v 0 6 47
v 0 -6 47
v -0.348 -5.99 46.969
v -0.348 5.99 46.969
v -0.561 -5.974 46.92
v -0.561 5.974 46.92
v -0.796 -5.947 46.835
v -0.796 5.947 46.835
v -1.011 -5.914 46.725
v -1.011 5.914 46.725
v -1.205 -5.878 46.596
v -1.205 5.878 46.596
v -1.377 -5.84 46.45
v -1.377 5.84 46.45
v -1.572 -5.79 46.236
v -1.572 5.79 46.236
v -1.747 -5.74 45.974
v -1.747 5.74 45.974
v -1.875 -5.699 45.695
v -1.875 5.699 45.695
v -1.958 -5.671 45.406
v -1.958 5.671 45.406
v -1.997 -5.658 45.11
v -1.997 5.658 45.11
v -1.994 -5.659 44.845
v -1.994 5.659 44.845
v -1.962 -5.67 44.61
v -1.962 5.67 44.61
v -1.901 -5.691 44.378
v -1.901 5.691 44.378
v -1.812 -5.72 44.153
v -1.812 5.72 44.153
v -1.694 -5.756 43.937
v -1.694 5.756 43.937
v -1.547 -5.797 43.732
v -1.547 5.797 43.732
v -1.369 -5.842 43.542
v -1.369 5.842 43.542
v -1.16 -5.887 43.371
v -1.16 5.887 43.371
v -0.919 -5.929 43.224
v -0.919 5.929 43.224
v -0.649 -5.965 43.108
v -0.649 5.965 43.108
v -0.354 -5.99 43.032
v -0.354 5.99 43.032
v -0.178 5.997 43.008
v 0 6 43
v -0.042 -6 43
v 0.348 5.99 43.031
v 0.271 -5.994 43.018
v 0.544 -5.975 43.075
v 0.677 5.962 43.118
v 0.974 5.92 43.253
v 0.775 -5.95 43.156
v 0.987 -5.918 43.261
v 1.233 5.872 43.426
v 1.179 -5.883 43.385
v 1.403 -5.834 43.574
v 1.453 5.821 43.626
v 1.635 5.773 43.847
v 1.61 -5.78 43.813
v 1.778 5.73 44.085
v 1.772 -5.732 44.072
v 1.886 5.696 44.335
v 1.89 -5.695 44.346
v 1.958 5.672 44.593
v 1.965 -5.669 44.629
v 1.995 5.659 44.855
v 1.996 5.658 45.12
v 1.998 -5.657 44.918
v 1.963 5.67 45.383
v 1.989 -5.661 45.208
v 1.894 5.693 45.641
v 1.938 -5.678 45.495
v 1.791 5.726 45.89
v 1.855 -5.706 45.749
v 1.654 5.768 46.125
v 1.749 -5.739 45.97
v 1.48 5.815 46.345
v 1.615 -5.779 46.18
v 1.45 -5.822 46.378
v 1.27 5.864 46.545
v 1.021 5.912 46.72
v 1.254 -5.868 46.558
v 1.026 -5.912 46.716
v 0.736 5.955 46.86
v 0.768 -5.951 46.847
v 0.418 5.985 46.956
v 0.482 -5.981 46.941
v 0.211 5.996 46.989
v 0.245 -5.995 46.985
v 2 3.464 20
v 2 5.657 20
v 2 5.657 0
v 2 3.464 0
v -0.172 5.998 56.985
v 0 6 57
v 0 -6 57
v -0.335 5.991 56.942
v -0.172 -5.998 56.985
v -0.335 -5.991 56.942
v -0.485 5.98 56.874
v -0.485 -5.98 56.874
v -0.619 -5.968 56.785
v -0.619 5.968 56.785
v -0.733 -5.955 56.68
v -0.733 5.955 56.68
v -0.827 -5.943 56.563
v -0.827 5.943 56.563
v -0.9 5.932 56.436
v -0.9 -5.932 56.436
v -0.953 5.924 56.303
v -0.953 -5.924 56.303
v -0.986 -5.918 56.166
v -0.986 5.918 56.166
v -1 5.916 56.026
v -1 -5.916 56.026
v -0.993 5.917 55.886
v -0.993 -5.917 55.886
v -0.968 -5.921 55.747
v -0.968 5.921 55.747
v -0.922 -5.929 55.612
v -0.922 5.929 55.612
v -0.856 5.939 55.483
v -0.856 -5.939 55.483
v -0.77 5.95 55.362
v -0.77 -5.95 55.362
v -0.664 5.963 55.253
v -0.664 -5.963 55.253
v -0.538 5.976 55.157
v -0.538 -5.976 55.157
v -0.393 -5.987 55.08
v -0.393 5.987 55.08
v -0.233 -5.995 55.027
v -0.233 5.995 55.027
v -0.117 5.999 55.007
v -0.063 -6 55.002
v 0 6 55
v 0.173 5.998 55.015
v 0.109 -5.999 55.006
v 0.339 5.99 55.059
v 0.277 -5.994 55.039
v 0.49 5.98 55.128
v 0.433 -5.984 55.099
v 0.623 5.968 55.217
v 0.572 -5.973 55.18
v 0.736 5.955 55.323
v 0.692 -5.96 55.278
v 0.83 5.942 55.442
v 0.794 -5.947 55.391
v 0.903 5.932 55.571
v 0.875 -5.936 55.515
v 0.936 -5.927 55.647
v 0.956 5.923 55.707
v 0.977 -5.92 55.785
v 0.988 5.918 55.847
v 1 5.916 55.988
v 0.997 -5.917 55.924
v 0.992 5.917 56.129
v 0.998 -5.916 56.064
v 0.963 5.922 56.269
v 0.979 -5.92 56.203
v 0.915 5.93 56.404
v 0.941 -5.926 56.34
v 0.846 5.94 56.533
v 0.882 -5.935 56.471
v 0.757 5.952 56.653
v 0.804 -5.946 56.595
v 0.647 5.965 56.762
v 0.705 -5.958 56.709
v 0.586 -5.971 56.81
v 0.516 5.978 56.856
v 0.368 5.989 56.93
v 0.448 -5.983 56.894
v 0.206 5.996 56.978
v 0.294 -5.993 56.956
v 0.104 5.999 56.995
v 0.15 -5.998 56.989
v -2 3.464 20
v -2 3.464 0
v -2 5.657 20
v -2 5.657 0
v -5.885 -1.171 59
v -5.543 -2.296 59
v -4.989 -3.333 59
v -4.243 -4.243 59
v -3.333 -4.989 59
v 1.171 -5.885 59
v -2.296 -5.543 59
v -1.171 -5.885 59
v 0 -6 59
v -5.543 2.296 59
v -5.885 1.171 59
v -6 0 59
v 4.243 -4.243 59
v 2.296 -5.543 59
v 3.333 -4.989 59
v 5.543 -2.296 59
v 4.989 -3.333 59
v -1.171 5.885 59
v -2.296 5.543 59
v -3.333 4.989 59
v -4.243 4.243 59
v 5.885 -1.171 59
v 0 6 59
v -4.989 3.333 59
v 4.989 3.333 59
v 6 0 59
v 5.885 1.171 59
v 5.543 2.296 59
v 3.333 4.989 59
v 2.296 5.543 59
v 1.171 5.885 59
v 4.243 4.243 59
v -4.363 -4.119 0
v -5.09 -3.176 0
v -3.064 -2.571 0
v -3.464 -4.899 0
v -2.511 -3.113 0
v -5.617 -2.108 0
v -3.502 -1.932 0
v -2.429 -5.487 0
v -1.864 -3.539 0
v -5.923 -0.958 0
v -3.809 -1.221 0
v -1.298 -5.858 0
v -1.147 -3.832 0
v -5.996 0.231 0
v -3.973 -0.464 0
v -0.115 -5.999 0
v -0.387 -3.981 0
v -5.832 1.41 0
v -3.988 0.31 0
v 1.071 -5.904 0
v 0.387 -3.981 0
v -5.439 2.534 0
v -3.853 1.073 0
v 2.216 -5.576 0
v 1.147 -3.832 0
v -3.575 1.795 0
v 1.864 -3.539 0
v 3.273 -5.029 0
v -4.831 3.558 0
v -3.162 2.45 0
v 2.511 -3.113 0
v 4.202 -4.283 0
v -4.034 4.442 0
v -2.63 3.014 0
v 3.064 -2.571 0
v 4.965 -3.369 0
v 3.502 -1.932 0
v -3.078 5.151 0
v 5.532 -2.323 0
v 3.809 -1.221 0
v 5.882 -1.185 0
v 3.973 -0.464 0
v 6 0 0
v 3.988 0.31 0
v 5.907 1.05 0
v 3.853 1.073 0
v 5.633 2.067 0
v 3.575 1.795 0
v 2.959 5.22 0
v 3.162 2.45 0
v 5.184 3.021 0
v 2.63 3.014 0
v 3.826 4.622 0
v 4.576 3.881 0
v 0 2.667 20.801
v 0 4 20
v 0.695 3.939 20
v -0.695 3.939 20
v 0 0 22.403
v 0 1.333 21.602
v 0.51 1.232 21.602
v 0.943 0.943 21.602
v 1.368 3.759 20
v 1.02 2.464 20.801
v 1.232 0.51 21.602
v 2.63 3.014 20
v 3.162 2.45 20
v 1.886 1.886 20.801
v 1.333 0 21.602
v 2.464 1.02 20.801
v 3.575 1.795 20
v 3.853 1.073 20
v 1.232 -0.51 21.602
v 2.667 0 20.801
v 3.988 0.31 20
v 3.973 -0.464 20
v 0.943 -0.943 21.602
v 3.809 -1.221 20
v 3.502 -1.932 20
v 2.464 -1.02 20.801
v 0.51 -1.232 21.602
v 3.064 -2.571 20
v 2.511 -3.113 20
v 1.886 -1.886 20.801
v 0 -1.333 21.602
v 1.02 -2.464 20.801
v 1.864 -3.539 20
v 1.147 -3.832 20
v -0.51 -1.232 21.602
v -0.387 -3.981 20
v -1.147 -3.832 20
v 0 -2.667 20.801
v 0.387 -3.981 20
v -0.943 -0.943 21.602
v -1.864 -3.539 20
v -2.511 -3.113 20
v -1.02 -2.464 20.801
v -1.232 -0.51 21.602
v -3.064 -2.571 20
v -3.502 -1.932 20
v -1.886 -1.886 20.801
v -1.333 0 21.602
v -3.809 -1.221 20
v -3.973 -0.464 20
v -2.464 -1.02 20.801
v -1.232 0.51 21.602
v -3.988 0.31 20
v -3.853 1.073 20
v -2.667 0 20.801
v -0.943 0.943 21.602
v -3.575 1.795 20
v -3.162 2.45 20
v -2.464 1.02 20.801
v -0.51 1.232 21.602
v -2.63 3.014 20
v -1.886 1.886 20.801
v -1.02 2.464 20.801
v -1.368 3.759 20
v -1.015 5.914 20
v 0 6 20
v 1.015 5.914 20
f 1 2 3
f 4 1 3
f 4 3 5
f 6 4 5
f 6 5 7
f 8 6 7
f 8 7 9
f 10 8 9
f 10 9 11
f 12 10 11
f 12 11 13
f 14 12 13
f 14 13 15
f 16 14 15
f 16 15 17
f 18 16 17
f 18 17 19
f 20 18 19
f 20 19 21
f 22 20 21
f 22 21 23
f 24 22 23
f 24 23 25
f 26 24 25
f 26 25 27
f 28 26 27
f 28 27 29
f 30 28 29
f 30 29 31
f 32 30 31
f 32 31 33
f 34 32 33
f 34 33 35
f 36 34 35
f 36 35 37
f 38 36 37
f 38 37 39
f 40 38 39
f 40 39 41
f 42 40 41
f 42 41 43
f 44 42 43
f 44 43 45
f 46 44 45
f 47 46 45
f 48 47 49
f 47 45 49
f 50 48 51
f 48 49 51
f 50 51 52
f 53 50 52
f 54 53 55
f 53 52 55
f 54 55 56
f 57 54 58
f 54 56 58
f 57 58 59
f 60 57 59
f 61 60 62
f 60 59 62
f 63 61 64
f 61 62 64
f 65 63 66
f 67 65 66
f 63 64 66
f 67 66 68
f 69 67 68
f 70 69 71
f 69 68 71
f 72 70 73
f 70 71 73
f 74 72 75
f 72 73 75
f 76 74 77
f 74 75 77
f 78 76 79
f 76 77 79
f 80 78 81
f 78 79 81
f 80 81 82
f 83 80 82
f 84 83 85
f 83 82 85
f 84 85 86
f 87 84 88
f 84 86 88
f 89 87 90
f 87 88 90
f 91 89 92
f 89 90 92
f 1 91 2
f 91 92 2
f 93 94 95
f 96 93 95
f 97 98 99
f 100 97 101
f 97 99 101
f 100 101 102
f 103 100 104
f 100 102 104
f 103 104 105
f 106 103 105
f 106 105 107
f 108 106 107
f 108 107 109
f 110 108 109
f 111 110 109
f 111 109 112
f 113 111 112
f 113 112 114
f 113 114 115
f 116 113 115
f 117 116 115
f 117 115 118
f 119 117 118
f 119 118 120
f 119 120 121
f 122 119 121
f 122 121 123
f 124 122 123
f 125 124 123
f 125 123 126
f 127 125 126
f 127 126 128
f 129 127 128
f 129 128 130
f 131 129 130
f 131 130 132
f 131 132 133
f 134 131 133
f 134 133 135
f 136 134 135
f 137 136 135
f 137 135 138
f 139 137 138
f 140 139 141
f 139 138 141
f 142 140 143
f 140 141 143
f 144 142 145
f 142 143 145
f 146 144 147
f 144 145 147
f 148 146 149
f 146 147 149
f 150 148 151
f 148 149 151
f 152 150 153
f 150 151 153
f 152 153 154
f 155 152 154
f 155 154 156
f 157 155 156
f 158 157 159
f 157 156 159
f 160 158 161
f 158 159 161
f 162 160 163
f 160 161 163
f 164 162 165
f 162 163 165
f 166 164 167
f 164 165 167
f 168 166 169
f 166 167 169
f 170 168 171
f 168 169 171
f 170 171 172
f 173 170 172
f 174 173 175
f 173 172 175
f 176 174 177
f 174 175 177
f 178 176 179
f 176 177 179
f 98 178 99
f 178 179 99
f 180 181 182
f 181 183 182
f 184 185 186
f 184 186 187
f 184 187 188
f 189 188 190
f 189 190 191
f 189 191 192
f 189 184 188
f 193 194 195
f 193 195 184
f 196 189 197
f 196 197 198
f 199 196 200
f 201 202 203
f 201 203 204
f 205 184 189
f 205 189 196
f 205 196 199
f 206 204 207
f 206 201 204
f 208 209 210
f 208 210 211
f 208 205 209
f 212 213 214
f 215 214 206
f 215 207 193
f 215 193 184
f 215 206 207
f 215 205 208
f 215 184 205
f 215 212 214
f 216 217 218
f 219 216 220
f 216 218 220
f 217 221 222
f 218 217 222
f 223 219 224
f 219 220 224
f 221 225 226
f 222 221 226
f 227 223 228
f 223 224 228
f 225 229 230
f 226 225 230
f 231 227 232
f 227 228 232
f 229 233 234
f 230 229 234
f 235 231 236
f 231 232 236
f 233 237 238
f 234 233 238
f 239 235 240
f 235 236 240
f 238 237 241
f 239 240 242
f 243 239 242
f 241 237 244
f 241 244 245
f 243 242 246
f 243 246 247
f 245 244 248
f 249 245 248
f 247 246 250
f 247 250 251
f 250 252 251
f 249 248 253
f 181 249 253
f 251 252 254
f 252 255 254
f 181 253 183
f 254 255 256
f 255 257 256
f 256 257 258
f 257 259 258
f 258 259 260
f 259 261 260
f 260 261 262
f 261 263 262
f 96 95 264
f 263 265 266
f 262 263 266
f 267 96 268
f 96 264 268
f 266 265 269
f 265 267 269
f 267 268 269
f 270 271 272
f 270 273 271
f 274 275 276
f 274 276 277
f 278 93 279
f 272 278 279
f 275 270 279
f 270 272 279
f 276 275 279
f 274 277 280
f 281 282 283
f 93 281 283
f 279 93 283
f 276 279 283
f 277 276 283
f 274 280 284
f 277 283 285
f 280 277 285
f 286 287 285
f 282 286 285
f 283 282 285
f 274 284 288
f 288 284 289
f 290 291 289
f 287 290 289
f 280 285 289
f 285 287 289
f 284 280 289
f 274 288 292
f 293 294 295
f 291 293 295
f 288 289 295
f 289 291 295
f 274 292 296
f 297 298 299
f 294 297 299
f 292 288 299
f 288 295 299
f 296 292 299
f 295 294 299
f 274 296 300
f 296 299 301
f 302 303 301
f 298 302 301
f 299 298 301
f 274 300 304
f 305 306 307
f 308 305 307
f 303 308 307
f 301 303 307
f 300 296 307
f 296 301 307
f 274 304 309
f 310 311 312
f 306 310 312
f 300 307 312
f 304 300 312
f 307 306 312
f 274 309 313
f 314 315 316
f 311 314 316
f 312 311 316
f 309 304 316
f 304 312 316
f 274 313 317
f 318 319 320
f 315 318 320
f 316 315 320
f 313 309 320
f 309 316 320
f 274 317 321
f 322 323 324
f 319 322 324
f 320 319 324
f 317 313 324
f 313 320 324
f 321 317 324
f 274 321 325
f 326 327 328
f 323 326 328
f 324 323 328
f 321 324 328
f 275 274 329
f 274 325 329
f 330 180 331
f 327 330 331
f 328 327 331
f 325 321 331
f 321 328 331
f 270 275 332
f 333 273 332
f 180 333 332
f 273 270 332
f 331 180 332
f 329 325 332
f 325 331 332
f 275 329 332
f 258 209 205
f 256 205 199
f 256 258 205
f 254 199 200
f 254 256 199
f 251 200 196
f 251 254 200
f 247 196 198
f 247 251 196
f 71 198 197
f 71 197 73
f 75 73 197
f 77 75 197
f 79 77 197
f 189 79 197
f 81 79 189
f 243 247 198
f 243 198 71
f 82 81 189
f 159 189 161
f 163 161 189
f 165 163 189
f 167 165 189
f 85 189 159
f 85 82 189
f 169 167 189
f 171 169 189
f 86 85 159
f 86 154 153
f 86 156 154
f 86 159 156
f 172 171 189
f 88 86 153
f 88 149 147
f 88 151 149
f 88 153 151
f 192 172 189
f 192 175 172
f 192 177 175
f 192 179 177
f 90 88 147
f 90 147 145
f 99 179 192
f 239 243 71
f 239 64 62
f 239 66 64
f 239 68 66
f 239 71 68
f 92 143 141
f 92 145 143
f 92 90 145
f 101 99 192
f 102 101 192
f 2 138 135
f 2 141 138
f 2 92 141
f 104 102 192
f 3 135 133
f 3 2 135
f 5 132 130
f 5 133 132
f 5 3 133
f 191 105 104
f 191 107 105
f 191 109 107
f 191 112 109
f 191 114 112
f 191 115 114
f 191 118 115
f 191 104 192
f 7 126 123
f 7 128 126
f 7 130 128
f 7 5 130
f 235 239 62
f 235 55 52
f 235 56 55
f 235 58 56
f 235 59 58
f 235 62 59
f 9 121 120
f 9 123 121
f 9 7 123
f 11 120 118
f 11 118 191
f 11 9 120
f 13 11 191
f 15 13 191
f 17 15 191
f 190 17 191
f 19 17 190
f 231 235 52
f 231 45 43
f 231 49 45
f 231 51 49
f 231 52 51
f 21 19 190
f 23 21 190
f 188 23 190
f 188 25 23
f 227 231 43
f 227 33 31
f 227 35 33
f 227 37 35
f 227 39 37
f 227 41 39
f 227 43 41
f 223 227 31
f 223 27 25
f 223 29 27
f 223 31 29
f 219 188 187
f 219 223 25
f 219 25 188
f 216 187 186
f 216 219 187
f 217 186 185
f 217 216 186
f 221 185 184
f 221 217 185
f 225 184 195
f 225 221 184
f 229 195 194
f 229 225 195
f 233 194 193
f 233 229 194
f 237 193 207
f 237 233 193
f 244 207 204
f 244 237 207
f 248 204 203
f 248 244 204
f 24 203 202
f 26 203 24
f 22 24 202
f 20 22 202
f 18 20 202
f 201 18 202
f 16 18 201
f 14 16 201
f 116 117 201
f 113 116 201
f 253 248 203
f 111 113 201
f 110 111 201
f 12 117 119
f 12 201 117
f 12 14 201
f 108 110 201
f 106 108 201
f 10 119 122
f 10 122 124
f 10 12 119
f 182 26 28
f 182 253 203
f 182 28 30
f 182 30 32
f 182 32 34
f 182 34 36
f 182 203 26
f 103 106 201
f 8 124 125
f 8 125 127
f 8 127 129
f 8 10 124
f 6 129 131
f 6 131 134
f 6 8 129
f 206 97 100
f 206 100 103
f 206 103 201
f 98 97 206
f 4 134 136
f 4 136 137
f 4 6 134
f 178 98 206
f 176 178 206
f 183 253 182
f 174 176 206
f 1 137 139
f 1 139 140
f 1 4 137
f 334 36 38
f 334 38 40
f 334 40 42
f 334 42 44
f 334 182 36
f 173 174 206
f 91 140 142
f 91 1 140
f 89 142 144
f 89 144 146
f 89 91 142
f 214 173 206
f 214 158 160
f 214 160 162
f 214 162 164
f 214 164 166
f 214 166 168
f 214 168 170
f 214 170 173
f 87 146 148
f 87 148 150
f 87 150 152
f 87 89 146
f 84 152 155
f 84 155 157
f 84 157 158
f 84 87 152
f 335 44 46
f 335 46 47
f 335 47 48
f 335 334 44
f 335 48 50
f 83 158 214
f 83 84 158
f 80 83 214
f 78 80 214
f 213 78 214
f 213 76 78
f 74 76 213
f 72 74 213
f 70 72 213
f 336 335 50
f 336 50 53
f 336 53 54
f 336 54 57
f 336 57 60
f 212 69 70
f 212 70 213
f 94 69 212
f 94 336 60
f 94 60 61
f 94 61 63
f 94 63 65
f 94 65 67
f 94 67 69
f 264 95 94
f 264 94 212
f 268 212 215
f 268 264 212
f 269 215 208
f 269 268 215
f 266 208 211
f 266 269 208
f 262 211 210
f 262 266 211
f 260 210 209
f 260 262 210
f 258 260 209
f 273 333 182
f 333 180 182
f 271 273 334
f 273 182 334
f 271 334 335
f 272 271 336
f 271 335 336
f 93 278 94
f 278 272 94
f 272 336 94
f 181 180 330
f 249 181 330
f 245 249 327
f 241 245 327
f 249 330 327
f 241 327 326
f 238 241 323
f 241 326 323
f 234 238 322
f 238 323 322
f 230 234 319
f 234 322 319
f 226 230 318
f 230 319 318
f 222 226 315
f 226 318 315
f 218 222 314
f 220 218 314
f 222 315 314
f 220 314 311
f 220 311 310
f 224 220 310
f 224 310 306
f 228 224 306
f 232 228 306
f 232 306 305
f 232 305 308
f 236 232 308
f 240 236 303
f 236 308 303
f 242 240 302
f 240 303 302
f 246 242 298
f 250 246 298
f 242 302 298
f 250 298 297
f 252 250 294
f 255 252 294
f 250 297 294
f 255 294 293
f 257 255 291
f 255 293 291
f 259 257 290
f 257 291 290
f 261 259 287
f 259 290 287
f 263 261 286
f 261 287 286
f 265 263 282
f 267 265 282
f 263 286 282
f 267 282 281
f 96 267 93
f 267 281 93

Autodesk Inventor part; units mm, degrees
ref_plane "YZ Plane" through (0, 0, 0) normal (1, 0, 0) x (0, 1, 0)
ref_plane "XY Plane" through (0, 0, 0) normal (0, 0, 1) x (1, 0, 0)
sketch "スケッチ1" plane through (0, 0, 0) normal (0, 0, 1) x (1, 0, 0)
  circle A0 centre (0, 0) radius 6
  dimension "d0" = 12
extrude "押し出し1" add sketch "スケッチ1" along normal blind 59
ref_plane "作業平面1" through (0, 6, 0) normal (0, 1, 0) x (-1, 0, 0)
sketch "スケッチ2" plane through (0, 6, 0) normal (0, 1, 0) x (-1, 0, 0)
  line L0 (0, 0) -> (2, 0)
  line L1 (2, 0) -> (2, 20)
  line L2 (2, 20) -> (0, 20)
  line L3 (0, 20) -> (0, 0)
  line L4 (6, 0) -> (-6, 0) projected
  line L5 (0, 20) -> (-2, 20)
  line L6 (-2, 20) -> (-2, 0)
  line L7 (-2, 0) -> (0, 0)
  line L8 (0, 0) -> (0, 20)
  dimension "d3" = 2
  dimension "d4" = 20
  dimension "d5" = 2
extrude "押し出し2" cut sketch "スケッチ2" against normal blind 6
sketch "スケッチ3" plane through (0, 0, 0) normal (0, 0, -1) x (-1, 0, 0)
  point P0 (0, 0)
  point P1 (0, 0)
hole "穴1" at (0, 0, 0) direction (0, 0, 1) diameter 8 depth 20 tip angle 118
sketch "スケッチ4" plane through (0, 6, 0) normal (0, 1, 0) x (-1, 0, 0)
  line L0 (2, 20) -> (-2, 20) projected
  point P0 (0, 0)
  point P1 (0, 45)
  dimension "d15" = 25
hole "穴2" at (0, 6, 45) direction (0, -1, 0) diameter 4 end through all
sketch "スケッチ5" plane through (0, 6, 0) normal (0, 1, 0) x (-1, 0, 0)
  line L0 (6, 59) -> (-6, 59) projected
  point P0 (0, 0)
  point P1 (0, 56)
  dimension "d23" = 3
hole "穴3" at (0, 6, 56) direction (0, -1, 0) diameter 2 end through all
properties part number "TH22_Bar_motor_roller_sn" material "アルミニウム 6061-AHC"
